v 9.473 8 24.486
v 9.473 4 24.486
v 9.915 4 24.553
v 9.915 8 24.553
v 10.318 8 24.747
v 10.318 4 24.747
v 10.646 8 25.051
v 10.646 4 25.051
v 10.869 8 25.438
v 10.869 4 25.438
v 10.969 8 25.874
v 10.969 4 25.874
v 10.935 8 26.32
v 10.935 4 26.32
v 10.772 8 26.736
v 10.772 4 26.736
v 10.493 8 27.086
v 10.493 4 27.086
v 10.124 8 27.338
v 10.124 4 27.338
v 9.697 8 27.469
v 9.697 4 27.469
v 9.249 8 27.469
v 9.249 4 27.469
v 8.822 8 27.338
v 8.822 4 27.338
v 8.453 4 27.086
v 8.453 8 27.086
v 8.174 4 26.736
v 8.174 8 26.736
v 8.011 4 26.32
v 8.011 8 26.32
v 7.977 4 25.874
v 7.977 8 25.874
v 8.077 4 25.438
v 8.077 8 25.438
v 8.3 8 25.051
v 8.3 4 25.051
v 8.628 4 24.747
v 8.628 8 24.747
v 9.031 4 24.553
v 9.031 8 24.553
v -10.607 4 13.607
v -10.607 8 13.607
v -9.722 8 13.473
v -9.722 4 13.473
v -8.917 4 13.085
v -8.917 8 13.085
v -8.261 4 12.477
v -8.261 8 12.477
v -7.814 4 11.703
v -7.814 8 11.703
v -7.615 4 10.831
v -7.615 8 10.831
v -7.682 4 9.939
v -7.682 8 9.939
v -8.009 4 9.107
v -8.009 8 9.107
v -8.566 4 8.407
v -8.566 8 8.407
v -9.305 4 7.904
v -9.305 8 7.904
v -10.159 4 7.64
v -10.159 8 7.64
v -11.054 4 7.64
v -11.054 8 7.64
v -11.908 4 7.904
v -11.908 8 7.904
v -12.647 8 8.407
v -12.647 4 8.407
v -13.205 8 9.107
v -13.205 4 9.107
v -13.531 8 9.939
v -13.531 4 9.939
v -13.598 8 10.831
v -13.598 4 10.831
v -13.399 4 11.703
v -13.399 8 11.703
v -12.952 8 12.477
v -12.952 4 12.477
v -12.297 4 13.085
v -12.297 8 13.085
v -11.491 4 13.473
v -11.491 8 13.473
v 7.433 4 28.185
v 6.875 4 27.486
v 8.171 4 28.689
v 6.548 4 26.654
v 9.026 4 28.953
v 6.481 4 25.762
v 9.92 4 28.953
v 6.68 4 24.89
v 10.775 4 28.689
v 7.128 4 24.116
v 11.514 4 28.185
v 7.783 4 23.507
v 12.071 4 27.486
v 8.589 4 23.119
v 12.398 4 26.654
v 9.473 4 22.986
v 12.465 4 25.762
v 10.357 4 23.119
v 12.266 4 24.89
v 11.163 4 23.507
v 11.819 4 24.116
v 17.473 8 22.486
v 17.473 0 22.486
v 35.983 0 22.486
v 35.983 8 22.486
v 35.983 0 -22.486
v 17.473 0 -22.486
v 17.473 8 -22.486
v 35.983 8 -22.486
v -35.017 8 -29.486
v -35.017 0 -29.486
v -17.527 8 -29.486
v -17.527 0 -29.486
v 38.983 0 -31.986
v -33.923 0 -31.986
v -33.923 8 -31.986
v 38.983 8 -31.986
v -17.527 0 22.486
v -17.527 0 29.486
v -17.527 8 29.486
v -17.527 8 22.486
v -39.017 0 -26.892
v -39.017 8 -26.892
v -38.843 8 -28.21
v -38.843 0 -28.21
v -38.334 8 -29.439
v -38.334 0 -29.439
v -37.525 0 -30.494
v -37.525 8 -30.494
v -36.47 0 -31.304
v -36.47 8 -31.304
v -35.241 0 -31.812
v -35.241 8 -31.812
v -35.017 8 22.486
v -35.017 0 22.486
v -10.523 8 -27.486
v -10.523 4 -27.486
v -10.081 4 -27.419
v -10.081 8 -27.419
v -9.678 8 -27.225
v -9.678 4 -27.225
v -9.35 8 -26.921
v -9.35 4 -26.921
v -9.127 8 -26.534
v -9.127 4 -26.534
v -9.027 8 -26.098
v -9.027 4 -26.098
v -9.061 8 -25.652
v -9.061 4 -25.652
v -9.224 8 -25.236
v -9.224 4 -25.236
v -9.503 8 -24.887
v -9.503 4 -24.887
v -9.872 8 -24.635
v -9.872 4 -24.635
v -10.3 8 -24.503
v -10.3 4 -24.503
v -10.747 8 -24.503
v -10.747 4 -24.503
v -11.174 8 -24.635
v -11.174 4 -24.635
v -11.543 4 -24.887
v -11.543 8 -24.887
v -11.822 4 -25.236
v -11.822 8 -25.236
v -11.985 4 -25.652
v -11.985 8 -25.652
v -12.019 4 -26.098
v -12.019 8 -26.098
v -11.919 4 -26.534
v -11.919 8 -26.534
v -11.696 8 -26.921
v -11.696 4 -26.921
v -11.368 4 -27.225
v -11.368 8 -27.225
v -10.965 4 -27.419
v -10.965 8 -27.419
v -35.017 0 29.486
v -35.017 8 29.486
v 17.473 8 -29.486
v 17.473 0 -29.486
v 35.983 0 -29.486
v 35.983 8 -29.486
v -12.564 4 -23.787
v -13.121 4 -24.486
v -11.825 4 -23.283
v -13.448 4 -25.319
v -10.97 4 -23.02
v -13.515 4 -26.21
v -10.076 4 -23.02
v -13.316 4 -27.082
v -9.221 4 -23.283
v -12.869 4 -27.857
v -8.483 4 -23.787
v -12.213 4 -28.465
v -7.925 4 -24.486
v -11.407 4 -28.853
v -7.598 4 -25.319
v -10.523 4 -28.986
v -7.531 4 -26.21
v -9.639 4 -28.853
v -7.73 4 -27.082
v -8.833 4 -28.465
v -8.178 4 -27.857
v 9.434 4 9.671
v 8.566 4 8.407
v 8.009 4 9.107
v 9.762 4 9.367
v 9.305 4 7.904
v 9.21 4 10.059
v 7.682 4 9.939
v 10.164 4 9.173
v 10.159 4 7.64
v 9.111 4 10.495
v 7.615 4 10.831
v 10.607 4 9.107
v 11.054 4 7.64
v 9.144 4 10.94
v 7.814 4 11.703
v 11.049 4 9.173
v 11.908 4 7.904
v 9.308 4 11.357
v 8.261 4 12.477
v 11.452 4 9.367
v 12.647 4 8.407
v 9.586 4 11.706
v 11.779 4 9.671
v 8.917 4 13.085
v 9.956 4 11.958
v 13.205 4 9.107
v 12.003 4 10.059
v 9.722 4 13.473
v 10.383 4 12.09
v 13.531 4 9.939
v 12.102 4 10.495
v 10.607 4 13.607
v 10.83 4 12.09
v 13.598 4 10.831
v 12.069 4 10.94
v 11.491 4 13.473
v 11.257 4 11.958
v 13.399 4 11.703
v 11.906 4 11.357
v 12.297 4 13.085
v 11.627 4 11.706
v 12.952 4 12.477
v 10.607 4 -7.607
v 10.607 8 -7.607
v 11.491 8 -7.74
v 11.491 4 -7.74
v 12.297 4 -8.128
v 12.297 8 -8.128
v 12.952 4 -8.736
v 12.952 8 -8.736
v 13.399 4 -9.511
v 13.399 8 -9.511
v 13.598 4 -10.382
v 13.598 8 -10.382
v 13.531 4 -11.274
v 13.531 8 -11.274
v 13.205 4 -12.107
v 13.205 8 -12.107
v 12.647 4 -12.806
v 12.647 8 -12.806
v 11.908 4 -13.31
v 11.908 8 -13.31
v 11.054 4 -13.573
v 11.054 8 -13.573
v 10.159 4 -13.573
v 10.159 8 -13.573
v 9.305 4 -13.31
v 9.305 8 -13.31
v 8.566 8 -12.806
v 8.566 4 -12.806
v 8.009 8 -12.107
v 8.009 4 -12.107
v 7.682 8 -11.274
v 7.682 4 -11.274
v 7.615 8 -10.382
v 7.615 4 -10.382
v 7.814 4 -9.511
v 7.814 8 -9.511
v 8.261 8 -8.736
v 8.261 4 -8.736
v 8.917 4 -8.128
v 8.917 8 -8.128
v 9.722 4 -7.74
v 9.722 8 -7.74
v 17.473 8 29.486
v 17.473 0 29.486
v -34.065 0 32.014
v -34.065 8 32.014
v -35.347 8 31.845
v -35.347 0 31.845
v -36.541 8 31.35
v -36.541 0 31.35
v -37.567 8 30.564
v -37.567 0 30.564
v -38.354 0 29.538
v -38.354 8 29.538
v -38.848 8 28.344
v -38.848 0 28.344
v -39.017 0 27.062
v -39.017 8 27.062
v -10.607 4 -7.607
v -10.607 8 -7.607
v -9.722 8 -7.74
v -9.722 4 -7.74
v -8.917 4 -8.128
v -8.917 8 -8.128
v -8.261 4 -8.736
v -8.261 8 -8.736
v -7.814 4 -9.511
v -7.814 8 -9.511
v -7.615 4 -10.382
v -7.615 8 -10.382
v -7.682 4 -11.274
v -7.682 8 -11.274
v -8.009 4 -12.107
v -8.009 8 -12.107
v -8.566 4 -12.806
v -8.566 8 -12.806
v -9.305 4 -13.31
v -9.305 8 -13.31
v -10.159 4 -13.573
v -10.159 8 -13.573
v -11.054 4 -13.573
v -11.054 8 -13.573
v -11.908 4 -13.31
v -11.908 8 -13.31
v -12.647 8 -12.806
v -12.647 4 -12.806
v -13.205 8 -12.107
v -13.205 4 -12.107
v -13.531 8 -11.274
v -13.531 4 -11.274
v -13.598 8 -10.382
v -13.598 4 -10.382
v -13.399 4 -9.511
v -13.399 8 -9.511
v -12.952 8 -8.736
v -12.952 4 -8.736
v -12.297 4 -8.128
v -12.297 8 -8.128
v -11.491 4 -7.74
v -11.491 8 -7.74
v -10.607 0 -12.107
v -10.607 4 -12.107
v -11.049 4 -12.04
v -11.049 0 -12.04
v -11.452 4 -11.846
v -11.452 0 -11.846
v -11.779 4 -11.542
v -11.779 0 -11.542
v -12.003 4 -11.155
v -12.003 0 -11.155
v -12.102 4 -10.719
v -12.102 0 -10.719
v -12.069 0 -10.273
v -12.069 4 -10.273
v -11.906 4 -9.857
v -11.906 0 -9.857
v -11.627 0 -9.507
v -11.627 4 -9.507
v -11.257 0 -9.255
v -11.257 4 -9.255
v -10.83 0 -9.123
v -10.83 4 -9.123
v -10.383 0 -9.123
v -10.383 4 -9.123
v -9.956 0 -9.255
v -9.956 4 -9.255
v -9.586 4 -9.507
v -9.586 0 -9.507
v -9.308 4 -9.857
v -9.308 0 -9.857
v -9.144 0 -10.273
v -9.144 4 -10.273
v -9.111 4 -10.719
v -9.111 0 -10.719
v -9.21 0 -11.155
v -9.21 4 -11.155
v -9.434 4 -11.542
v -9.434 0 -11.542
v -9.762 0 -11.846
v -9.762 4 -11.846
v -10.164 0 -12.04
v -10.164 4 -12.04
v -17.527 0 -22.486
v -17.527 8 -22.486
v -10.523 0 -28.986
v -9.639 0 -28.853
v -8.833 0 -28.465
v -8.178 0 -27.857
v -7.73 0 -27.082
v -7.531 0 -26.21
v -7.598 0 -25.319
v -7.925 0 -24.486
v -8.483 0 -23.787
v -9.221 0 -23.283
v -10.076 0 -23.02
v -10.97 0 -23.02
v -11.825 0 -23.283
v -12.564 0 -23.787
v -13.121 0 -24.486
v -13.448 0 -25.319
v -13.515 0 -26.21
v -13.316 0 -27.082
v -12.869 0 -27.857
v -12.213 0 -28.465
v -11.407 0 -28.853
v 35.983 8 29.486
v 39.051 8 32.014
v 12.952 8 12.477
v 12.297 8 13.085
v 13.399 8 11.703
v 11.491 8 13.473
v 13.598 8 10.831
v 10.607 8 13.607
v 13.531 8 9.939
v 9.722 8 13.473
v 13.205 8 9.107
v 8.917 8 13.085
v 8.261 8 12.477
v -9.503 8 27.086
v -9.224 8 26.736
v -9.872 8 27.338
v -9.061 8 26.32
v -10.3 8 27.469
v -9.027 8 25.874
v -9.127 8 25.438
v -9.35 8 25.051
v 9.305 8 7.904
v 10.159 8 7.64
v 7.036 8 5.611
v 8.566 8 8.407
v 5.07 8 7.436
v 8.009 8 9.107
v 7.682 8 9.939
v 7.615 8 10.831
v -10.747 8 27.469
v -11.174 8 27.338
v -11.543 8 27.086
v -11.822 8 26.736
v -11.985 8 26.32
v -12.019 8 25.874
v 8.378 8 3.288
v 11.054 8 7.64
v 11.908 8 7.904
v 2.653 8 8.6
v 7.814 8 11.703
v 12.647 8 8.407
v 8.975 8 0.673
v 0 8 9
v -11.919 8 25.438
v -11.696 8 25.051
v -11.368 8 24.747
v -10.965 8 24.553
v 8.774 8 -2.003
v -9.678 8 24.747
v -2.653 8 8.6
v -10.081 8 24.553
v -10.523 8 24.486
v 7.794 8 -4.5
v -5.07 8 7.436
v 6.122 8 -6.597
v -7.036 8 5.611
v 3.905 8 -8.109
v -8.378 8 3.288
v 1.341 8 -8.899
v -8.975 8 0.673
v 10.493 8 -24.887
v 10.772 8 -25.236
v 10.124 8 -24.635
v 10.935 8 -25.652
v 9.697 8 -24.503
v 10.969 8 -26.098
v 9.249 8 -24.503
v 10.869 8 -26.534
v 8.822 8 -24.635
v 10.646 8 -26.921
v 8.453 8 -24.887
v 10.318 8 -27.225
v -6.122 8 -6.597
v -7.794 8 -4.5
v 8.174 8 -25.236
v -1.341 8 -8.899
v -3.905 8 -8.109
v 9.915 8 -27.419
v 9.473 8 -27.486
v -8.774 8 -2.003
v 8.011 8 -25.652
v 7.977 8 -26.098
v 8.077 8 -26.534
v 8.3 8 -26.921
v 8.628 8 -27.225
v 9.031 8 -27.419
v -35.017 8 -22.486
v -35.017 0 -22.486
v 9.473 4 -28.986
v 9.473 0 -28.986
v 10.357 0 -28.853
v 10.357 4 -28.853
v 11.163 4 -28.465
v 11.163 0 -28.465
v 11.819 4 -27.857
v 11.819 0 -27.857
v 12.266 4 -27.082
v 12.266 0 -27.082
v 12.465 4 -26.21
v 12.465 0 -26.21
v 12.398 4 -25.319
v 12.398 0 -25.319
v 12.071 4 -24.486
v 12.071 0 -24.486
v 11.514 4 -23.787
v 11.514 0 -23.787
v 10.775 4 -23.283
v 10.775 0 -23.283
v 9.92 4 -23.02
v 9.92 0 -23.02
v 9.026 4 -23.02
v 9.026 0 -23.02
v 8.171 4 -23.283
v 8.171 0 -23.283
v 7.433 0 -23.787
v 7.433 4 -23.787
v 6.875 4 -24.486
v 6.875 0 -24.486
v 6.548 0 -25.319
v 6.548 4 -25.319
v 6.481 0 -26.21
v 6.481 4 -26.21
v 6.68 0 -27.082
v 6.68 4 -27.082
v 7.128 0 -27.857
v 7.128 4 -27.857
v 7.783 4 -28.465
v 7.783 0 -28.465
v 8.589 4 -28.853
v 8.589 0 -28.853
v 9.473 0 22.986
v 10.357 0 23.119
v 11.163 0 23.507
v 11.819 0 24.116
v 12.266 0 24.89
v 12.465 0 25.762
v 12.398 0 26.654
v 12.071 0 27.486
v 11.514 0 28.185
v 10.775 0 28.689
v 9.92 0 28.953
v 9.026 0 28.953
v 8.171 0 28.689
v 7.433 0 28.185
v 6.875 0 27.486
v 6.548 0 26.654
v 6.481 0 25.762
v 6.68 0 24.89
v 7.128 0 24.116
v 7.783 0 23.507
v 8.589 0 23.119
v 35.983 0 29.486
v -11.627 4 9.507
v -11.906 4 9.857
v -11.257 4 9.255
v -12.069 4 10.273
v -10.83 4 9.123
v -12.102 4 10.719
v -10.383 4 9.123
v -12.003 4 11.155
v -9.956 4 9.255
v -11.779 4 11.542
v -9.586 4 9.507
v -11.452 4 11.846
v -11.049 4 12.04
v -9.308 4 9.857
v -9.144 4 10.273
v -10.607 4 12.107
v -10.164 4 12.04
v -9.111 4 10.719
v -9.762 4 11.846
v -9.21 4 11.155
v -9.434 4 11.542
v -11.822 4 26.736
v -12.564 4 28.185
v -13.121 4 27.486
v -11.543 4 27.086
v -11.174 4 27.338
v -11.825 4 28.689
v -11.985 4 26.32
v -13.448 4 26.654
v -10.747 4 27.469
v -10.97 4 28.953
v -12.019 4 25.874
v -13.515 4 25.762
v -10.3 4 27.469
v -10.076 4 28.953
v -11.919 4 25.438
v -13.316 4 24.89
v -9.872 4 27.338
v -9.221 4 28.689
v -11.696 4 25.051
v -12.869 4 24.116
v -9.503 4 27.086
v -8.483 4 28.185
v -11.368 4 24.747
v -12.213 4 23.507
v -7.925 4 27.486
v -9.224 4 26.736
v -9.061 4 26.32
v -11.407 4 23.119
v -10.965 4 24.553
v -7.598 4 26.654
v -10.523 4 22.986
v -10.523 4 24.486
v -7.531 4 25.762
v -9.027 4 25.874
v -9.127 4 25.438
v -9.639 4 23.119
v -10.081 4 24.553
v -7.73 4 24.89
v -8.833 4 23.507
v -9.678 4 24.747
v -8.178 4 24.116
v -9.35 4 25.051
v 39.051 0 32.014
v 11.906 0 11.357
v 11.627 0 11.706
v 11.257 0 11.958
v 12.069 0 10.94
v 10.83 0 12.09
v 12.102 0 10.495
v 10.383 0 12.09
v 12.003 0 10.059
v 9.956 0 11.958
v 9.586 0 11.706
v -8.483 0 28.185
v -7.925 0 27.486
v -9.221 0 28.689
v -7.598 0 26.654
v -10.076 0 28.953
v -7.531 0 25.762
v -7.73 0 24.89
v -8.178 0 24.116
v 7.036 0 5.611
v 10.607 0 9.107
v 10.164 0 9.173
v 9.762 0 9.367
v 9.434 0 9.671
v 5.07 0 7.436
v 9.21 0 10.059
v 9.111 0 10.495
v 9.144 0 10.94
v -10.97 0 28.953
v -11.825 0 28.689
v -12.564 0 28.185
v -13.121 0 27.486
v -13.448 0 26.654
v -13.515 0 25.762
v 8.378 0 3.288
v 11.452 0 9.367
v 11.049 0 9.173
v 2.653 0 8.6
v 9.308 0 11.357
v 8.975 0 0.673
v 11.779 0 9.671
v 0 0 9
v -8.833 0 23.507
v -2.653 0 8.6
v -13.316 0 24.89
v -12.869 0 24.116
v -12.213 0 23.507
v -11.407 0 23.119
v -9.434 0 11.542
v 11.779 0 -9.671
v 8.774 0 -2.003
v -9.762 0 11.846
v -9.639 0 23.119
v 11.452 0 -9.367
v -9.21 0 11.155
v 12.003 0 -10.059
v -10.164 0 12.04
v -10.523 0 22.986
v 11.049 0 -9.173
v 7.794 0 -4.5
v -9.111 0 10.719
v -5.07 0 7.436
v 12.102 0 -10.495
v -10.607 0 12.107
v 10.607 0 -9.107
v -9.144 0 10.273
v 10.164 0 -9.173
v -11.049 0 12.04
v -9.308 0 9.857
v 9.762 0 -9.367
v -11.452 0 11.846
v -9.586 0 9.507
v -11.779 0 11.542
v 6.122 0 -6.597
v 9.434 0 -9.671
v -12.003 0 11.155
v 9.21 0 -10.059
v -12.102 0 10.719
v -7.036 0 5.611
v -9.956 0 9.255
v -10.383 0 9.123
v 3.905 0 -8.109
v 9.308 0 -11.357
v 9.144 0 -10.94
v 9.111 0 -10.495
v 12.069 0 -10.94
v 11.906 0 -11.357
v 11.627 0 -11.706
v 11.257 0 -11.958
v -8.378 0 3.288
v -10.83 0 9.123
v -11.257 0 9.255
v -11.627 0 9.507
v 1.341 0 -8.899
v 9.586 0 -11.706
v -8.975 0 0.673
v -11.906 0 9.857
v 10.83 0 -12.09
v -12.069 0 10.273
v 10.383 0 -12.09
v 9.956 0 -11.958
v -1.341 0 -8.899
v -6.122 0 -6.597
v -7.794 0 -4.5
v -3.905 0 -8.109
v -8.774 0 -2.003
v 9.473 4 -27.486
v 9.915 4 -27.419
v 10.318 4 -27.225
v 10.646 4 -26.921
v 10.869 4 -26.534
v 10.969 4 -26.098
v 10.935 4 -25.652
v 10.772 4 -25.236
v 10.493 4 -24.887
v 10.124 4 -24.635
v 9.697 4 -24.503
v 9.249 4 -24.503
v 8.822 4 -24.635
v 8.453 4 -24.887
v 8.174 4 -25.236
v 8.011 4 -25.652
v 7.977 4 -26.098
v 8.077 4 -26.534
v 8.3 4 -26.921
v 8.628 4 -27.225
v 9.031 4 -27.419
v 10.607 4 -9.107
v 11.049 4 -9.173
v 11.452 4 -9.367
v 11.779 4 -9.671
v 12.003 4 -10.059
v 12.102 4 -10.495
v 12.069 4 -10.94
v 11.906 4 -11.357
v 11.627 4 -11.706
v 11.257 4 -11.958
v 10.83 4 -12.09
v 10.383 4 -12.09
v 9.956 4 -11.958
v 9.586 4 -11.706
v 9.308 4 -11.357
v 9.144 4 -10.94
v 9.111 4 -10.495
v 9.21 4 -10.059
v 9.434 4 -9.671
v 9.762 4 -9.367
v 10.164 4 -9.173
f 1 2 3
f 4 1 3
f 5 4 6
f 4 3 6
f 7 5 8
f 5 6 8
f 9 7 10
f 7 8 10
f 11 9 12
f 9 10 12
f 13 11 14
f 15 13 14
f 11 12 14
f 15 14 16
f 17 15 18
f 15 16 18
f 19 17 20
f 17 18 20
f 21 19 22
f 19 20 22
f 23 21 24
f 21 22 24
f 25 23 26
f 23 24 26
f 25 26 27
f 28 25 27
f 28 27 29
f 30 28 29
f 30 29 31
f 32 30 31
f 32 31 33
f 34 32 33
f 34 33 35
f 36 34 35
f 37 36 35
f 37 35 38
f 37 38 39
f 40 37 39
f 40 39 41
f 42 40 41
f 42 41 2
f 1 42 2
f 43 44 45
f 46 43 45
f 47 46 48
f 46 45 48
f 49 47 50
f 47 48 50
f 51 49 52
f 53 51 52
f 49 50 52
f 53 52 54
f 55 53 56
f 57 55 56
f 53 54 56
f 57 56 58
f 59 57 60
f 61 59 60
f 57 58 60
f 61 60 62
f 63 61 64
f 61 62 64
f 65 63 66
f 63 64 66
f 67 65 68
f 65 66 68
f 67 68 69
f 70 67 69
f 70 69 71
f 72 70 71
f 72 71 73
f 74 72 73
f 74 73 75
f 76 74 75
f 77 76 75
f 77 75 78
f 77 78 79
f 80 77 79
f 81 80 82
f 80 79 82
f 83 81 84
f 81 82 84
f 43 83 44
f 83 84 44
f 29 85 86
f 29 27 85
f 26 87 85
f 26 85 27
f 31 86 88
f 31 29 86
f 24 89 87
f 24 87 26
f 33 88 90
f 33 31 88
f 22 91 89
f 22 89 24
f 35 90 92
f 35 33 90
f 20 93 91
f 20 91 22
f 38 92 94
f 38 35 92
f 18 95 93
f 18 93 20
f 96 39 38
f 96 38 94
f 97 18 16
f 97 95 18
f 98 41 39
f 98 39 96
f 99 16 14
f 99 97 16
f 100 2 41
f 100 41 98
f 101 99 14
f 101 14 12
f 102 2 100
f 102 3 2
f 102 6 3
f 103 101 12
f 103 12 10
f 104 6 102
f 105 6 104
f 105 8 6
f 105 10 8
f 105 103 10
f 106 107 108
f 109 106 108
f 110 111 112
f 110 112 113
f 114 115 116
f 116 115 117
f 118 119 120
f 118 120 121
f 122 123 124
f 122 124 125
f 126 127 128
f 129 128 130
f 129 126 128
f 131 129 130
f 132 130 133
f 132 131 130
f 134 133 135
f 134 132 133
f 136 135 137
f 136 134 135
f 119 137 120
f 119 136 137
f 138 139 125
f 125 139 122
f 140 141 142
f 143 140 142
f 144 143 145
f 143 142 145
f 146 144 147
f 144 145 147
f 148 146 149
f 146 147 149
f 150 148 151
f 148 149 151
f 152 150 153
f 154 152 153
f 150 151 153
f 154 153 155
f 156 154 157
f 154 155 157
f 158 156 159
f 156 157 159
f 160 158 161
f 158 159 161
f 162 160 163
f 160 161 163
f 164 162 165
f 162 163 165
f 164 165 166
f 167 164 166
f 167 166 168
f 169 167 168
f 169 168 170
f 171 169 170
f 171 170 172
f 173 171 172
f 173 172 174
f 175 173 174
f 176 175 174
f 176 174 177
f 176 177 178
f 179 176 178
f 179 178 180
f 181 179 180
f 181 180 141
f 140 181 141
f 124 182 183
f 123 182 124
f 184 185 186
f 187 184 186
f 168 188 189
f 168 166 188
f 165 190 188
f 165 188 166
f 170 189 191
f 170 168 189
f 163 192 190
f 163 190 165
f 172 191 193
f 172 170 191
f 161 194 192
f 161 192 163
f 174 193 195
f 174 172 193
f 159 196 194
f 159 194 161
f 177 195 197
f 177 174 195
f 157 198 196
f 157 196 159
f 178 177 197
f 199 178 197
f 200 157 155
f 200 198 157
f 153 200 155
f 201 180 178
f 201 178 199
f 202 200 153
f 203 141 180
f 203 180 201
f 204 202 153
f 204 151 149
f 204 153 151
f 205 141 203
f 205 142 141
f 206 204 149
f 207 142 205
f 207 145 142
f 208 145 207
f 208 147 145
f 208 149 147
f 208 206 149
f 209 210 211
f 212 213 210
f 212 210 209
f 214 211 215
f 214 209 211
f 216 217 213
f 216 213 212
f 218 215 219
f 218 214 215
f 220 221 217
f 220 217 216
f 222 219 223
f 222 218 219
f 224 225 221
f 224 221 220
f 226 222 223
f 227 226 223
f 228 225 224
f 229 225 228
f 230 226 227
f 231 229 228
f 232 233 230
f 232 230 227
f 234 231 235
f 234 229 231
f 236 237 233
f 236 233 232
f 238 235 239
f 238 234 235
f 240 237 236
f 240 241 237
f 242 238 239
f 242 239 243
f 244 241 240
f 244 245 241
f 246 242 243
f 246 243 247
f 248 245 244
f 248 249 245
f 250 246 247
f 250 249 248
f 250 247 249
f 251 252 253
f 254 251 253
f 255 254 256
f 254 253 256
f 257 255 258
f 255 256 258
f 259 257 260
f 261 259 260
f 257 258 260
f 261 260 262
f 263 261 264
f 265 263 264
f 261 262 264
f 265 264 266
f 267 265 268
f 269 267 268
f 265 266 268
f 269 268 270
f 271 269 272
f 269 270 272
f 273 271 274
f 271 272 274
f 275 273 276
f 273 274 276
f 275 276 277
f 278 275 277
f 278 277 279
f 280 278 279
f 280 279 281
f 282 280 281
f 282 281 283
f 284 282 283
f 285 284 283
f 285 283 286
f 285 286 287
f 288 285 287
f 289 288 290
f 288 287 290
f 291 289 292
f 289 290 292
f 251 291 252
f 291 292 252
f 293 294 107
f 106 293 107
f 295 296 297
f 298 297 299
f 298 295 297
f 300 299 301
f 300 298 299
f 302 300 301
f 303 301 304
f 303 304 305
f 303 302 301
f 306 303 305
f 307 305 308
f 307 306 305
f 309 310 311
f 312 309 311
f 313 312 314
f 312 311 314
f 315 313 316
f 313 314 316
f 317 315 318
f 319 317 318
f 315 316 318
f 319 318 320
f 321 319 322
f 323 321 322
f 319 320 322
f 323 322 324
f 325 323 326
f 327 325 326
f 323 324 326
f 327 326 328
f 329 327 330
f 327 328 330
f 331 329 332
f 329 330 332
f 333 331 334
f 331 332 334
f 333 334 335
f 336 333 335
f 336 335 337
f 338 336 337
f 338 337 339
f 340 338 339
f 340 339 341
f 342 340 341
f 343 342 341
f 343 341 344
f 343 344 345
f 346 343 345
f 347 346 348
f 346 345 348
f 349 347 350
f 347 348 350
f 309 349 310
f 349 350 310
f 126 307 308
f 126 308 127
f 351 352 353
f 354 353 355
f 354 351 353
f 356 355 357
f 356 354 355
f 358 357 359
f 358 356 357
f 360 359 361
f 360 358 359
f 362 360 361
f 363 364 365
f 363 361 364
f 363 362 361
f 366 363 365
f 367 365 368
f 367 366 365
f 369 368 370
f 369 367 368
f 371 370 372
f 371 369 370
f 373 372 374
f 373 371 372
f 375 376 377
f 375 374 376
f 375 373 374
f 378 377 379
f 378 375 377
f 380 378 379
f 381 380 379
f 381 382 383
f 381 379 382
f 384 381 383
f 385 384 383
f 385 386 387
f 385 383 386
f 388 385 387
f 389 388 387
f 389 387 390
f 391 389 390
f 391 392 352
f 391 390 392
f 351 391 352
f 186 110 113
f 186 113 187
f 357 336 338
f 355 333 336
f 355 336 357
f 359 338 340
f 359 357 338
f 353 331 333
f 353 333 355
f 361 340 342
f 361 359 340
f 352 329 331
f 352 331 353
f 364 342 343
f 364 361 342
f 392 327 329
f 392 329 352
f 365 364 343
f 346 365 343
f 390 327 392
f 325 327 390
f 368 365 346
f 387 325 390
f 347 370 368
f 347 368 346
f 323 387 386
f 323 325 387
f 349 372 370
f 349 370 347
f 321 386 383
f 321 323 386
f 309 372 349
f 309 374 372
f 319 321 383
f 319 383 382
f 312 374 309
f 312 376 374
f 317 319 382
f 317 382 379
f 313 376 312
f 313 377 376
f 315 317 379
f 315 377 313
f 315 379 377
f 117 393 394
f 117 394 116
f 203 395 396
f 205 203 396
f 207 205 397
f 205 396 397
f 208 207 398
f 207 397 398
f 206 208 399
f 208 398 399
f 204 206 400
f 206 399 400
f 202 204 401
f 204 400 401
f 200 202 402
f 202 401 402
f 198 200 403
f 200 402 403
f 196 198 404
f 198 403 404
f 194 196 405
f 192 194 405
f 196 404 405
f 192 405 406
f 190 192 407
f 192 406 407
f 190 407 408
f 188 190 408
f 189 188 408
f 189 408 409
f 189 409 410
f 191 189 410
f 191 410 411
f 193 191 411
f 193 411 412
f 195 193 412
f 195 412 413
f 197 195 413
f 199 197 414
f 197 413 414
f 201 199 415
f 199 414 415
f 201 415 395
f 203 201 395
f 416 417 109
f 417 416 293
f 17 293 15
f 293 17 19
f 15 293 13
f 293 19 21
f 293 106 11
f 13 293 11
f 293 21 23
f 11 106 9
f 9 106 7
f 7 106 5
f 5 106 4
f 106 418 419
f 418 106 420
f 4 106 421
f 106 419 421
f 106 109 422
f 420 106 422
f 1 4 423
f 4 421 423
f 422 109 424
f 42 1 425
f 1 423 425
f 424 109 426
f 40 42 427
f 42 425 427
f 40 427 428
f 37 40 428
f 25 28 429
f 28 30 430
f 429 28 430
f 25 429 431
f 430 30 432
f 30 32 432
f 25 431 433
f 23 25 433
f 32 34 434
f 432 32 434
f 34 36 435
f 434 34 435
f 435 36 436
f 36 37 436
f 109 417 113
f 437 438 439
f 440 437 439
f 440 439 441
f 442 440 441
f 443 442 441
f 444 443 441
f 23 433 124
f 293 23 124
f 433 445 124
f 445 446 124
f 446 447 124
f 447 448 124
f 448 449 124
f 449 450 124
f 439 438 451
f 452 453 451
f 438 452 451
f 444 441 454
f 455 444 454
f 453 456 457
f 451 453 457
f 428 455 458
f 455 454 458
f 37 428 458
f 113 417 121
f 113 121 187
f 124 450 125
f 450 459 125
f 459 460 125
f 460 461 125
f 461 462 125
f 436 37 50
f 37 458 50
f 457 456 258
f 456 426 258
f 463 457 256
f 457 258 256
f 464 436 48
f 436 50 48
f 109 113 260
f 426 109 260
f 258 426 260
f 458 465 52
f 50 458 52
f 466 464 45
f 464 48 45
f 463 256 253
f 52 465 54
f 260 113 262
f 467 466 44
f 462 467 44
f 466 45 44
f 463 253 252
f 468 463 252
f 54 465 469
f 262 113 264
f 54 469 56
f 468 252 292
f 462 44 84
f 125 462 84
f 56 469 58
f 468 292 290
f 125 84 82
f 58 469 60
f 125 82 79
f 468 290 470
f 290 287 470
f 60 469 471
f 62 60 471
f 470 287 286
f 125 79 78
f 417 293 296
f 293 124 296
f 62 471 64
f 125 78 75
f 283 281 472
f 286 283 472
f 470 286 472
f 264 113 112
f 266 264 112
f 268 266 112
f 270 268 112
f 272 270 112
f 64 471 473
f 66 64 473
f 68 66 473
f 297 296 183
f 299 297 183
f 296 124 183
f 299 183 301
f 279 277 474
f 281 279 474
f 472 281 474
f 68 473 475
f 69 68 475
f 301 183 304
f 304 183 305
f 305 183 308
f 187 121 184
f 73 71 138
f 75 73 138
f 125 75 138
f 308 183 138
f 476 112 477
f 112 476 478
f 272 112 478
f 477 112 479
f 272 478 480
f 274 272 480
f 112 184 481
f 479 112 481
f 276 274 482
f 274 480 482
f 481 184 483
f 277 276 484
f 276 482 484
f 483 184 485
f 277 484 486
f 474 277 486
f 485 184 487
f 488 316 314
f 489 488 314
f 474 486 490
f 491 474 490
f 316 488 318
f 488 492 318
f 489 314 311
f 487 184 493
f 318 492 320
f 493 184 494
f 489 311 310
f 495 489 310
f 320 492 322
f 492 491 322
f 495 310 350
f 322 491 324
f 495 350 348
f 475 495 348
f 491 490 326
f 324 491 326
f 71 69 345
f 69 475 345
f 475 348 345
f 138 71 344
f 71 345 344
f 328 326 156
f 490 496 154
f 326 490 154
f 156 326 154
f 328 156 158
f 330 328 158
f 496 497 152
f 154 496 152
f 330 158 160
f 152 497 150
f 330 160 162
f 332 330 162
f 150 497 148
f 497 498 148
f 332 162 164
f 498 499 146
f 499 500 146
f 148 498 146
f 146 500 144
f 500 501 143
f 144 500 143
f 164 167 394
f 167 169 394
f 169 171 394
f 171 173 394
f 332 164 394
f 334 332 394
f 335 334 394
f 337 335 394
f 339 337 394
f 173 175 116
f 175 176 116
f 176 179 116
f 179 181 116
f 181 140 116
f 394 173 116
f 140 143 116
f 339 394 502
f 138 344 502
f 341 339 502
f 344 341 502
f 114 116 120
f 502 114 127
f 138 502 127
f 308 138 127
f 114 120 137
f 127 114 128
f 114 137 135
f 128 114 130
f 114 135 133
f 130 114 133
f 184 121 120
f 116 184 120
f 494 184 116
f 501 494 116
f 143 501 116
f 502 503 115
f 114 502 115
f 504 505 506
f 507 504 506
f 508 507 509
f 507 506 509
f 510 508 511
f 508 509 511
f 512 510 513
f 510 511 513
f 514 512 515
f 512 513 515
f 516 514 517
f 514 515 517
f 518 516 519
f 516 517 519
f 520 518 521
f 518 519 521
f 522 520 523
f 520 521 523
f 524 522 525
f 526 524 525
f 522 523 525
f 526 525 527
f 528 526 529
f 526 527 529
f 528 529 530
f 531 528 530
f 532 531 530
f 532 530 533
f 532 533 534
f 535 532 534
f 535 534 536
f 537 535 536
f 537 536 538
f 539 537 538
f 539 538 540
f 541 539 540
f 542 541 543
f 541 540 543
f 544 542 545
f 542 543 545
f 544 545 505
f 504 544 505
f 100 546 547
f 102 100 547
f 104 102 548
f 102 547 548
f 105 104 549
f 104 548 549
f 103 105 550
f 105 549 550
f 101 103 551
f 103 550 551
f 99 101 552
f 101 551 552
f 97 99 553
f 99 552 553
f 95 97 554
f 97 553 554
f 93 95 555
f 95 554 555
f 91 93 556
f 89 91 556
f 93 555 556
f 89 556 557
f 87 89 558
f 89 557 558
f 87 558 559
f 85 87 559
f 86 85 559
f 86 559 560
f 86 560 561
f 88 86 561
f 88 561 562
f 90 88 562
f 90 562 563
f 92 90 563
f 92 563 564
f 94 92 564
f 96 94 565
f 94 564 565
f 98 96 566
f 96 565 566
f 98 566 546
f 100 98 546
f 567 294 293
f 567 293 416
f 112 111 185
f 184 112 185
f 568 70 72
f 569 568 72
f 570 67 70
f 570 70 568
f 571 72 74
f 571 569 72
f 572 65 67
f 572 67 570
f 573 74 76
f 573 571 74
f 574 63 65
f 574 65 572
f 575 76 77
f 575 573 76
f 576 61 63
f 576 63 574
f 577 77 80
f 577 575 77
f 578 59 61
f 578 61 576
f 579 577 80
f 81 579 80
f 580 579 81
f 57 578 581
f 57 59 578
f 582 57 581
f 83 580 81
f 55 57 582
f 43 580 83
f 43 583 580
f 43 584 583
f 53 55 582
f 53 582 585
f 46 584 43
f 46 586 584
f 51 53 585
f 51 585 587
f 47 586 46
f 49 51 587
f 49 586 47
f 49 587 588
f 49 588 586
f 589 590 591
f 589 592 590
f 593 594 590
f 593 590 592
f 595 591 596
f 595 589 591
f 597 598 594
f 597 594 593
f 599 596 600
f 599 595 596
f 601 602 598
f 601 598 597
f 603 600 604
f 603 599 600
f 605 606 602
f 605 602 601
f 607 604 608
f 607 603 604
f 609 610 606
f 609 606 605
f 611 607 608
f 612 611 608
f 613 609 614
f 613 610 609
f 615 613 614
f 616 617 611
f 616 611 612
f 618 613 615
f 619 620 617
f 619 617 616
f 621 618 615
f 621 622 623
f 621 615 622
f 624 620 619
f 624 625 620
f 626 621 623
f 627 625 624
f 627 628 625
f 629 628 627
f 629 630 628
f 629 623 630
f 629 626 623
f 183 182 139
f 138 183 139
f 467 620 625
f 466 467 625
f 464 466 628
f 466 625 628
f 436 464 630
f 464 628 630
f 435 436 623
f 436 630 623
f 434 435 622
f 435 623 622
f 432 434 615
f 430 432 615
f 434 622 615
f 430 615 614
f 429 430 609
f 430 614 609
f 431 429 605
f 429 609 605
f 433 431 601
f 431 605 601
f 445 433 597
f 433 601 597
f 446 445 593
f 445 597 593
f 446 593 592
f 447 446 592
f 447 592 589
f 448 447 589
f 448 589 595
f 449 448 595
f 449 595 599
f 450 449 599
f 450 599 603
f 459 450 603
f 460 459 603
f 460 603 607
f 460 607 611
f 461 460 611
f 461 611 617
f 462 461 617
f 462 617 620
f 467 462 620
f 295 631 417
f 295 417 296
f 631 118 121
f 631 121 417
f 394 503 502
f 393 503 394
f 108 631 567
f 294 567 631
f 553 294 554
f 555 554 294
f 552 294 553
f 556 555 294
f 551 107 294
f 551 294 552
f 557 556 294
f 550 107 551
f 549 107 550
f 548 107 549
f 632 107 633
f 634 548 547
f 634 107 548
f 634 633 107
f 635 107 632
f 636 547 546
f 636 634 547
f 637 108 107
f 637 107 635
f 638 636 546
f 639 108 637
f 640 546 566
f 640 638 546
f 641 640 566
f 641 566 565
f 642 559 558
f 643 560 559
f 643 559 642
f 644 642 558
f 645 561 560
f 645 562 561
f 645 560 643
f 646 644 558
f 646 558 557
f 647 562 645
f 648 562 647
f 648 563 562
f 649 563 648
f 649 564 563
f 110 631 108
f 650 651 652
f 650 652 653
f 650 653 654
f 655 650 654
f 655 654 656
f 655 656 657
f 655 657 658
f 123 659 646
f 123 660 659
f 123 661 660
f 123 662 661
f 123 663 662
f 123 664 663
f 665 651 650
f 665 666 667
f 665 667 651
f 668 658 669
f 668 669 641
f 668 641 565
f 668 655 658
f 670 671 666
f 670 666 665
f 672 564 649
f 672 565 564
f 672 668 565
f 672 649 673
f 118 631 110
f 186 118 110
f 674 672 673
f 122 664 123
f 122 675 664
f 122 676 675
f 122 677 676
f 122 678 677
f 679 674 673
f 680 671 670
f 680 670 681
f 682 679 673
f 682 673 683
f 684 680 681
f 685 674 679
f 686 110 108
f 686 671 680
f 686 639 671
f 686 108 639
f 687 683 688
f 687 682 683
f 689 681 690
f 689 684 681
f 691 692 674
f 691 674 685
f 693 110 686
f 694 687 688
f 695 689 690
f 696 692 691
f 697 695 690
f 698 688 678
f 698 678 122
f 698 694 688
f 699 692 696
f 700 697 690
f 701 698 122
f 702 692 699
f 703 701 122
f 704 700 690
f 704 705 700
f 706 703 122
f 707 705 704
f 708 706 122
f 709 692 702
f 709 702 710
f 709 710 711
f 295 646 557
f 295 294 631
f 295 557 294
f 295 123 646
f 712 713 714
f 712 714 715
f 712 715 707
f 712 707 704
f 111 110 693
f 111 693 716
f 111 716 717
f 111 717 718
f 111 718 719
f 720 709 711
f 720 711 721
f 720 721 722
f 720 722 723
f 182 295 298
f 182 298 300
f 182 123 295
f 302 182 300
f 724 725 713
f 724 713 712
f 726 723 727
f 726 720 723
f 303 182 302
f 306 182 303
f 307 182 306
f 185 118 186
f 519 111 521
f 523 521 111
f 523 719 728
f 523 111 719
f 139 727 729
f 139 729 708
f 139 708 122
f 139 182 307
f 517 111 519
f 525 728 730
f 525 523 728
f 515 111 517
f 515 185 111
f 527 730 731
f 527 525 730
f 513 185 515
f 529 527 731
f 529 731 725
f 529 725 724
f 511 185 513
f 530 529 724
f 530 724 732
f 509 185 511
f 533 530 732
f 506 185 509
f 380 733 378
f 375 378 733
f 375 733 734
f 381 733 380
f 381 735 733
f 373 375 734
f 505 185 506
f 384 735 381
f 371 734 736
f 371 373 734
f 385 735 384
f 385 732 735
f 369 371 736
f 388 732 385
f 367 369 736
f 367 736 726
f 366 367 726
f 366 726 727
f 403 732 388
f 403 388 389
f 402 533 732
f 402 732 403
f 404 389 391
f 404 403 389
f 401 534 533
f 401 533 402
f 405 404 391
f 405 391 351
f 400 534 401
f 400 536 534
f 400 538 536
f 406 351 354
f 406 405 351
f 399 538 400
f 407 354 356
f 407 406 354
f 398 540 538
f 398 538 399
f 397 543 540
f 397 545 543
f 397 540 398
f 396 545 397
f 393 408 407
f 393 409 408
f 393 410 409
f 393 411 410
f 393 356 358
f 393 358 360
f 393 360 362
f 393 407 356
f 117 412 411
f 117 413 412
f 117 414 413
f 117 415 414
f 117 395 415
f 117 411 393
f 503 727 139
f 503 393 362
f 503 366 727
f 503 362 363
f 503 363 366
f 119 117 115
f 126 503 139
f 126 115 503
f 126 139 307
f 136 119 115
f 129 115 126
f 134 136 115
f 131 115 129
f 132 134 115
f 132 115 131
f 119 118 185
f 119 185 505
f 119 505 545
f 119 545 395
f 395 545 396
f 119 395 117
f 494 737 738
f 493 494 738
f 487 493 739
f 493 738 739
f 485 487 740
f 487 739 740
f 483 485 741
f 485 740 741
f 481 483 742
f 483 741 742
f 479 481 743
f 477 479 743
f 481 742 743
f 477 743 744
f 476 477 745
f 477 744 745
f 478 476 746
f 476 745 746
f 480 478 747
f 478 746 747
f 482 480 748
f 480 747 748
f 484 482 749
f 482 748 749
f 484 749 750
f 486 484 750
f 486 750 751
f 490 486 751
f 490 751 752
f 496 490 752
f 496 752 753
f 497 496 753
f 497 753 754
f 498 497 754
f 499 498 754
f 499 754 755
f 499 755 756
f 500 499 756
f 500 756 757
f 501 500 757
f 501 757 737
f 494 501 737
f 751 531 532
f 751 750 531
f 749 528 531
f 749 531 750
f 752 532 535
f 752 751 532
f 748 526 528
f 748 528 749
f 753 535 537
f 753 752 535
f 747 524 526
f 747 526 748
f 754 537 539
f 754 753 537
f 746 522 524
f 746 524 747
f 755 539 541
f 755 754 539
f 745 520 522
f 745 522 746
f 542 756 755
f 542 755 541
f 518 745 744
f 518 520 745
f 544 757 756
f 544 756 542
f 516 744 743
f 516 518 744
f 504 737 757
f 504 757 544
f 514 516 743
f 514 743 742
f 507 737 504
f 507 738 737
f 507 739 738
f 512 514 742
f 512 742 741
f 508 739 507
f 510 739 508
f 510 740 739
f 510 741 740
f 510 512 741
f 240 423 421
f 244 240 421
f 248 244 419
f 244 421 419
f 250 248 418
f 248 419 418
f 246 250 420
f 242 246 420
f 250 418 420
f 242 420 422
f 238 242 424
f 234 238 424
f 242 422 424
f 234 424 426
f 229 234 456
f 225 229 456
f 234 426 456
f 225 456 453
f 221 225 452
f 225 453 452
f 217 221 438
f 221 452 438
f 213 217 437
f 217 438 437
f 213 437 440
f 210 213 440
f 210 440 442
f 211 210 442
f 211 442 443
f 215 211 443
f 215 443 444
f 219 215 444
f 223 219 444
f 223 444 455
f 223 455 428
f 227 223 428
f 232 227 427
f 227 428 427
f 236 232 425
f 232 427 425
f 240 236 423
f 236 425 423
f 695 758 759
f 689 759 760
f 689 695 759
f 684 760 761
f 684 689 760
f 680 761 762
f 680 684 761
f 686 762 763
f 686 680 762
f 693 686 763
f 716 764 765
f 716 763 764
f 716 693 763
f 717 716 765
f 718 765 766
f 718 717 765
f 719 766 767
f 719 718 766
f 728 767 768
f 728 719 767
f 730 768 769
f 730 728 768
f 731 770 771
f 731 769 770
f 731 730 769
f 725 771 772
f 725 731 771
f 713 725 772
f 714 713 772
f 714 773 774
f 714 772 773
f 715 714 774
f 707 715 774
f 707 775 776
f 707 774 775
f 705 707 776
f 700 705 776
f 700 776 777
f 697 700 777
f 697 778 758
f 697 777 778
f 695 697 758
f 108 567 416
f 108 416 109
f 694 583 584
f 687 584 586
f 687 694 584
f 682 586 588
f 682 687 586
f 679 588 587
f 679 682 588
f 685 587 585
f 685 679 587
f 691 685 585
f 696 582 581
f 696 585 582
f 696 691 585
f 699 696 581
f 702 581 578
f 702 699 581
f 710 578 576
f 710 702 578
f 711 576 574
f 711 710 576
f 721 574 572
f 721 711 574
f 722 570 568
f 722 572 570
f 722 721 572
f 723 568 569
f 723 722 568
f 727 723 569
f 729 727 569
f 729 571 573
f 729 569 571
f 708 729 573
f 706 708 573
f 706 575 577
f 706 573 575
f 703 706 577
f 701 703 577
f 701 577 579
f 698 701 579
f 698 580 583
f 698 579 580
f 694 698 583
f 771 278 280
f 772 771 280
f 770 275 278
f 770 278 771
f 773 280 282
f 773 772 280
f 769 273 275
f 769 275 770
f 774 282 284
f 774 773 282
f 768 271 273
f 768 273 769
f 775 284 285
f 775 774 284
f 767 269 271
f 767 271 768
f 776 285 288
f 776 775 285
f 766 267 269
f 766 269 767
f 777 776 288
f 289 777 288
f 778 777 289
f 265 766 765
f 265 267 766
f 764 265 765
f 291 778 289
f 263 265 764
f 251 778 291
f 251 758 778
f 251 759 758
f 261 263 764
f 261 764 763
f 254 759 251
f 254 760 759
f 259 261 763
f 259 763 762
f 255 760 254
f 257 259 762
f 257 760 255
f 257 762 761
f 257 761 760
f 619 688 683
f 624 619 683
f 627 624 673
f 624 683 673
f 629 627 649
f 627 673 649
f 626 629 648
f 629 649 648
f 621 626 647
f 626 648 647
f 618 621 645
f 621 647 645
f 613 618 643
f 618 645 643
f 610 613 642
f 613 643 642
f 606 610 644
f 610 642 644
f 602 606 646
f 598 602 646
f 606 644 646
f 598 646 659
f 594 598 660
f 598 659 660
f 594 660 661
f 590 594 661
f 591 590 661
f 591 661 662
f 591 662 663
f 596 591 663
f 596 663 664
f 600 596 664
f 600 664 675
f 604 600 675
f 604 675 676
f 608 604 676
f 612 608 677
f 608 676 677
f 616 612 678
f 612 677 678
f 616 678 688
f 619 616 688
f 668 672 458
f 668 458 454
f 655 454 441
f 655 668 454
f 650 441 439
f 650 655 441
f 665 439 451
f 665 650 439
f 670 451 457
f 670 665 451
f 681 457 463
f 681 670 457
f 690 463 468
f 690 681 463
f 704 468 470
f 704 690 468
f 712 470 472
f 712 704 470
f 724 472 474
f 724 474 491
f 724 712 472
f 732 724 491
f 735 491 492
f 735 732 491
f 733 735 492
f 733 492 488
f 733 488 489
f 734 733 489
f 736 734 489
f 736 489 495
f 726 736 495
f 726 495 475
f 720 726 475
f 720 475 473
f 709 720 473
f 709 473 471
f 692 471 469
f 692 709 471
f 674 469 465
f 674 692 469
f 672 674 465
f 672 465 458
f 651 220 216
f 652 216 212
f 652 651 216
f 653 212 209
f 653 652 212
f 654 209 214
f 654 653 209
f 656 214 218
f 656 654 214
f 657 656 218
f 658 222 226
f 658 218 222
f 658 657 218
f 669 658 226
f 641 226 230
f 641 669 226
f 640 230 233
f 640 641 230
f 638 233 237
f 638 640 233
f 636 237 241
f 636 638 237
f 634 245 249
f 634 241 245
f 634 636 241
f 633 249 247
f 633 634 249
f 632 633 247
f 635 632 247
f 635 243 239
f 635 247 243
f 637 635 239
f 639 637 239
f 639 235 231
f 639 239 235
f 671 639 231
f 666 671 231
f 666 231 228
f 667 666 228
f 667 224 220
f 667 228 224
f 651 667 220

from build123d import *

# Parameters (mm, degrees)
SKETCH1_R           = 9
SKETCH1_R_2         = 1.5
SKETCH1_W           = 17.49
SKETCH1_H           = 7
SKETCH1_W_2         = 18.51
BOSS_EXTRUDE1_DEPTH = 8
SKETCH2_R           = 3
CUT_EXTRUDE1_DEPTH  = 4
SKETCH5_R           = 1.5
CUT_EXTRUDE3_DEPTH  = 52.125968688
SKETCH5_3_R         = 3
SKETCH5_3_R_2       = 1.5
CUT_EXTRUDE4_DEPTH  = 4


with BuildPart() as part:
    # Sketch1 → Boss-Extrude1 (new body)
    with BuildSketch(Plane(origin=(0, 0, 0), x_dir=(1, 0, 0), z_dir=(0, 1, 0))):
        with BuildLine():
            Line((-33.922517503, 31.986083161), (38.983038853, 31.986083161))
            Line((38.983038853, 31.986083161), (39.05091296, -32.013916839))
            Line((39.05091296, -32.013916839), (-34.065012631, -32.013916839))
            ThreePointArc((-34.065012631, -32.013916839), (-37.566569007, -30.563524698), (-39.016961147, -27.061968322))
            Line((-39.016961147, -27.061968322), (-39.016961147, 26.891639518))
            ThreePointArc((-39.016961147, 26.891639518), (-37.52483315, 30.493955165), (-33.922517503, 31.986083161))
        make_face()
        Circle(SKETCH1_R, mode=Mode.SUBTRACT)
        with Locations((10.606601718, 10.606601718)):
            Circle(SKETCH1_R_2, mode=Mode.SUBTRACT)
        with Locations((-10.606601718, 10.606601718)):
            Circle(SKETCH1_R_2, mode=Mode.SUBTRACT)
        with Locations((10.606601718, -10.606601718)):
            Circle(SKETCH1_R_2, mode=Mode.SUBTRACT)
        with Locations((-10.606601718, -10.606601718)):
            Circle(SKETCH1_R_2, mode=Mode.SUBTRACT)
        with Locations((-26.271961147, 25.986083161)):
            Rectangle(SKETCH1_W, SKETCH1_H, mode=Mode.SUBTRACT)
        with Locations((26.728038853, 25.986083161)):
            Rectangle(SKETCH1_W_2, SKETCH1_H, mode=Mode.SUBTRACT)
        with Locations((26.728038853, -25.986083161)):
            Rectangle(SKETCH1_W_2, SKETCH1_H, mode=Mode.SUBTRACT)
        with Locations((-26.271961147, -25.986083161)):
            Rectangle(SKETCH1_W, SKETCH1_H, mode=Mode.SUBTRACT)
    extrude(amount=BOSS_EXTRUDE1_DEPTH)

    # Sketch2 → Cut-Extrude1 (cut)
    with BuildSketch(Plane(origin=(0, 8, 0), x_dir=(1, 0, 0), z_dir=(0, 1, 0))):
        with Locations((10.606601718, 10.606601718)):
            Circle(SKETCH2_R)
        with Locations((10.606601718, -10.606601718)):
            Circle(SKETCH2_R)
        with Locations((-10.606601718, -10.606601718)):
            Circle(SKETCH2_R)
        with Locations((-10.606601718, 10.606601718)):
            Circle(SKETCH2_R)
    extrude(amount=-CUT_EXTRUDE1_DEPTH, mode=Mode.SUBTRACT)

    # Sketch5 → Cut-Extrude3 (cut, through all)
    with BuildSketch(Plane.XZ):
        with Locations((-10.52309756, 25.986083161)):
            Circle(SKETCH5_R)
        with Locations((9.473038853, 25.986083161)):
            Circle(SKETCH5_R)
        with Locations((9.473038853, -25.986083161)):
            Circle(SKETCH5_R)
        with Locations((-10.52309756, -25.986083161)):
            Circle(SKETCH5_R)
    extrude(amount=-CUT_EXTRUDE3_DEPTH, mode=Mode.SUBTRACT)

    # Sketch5<3> → Cut-Extrude4 (cut)
    # profile 1 of 4: a face of its own
    with BuildSketch(Plane.XZ):
        with Locations((-10.52309756, 25.986083161)):
            Circle(SKETCH5_3_R)
        with Locations((-10.52309756, 25.986083161)):
            Circle(SKETCH5_3_R_2, mode=Mode.SUBTRACT)
    # profile 2 of 4: a face of its own
    with BuildSketch(Plane.XZ):
        with Locations((9.473038853, 25.986083161)):
            Circle(SKETCH5_3_R)
        with Locations((9.473038853, 25.986083161)):
            Circle(SKETCH5_3_R_2, mode=Mode.SUBTRACT)
    # profile 3 of 4: a face of its own
    with BuildSketch(Plane.XZ):
        with Locations((9.473038853, -25.986083161)):
            Circle(SKETCH5_3_R)
        with Locations((9.473038853, -25.986083161)):
            Circle(SKETCH5_3_R_2, mode=Mode.SUBTRACT)
    # profile 4 of 4: a face of its own
    with BuildSketch(Plane.XZ):
        with Locations((-10.52309756, -25.986083161)):
            Circle(SKETCH5_3_R)
        with Locations((-10.52309756, -25.986083161)):
            Circle(SKETCH5_3_R_2, mode=Mode.SUBTRACT)
    extrude(amount=-CUT_EXTRUDE4_DEPTH, mode=Mode.SUBTRACT)


solid = part.part
